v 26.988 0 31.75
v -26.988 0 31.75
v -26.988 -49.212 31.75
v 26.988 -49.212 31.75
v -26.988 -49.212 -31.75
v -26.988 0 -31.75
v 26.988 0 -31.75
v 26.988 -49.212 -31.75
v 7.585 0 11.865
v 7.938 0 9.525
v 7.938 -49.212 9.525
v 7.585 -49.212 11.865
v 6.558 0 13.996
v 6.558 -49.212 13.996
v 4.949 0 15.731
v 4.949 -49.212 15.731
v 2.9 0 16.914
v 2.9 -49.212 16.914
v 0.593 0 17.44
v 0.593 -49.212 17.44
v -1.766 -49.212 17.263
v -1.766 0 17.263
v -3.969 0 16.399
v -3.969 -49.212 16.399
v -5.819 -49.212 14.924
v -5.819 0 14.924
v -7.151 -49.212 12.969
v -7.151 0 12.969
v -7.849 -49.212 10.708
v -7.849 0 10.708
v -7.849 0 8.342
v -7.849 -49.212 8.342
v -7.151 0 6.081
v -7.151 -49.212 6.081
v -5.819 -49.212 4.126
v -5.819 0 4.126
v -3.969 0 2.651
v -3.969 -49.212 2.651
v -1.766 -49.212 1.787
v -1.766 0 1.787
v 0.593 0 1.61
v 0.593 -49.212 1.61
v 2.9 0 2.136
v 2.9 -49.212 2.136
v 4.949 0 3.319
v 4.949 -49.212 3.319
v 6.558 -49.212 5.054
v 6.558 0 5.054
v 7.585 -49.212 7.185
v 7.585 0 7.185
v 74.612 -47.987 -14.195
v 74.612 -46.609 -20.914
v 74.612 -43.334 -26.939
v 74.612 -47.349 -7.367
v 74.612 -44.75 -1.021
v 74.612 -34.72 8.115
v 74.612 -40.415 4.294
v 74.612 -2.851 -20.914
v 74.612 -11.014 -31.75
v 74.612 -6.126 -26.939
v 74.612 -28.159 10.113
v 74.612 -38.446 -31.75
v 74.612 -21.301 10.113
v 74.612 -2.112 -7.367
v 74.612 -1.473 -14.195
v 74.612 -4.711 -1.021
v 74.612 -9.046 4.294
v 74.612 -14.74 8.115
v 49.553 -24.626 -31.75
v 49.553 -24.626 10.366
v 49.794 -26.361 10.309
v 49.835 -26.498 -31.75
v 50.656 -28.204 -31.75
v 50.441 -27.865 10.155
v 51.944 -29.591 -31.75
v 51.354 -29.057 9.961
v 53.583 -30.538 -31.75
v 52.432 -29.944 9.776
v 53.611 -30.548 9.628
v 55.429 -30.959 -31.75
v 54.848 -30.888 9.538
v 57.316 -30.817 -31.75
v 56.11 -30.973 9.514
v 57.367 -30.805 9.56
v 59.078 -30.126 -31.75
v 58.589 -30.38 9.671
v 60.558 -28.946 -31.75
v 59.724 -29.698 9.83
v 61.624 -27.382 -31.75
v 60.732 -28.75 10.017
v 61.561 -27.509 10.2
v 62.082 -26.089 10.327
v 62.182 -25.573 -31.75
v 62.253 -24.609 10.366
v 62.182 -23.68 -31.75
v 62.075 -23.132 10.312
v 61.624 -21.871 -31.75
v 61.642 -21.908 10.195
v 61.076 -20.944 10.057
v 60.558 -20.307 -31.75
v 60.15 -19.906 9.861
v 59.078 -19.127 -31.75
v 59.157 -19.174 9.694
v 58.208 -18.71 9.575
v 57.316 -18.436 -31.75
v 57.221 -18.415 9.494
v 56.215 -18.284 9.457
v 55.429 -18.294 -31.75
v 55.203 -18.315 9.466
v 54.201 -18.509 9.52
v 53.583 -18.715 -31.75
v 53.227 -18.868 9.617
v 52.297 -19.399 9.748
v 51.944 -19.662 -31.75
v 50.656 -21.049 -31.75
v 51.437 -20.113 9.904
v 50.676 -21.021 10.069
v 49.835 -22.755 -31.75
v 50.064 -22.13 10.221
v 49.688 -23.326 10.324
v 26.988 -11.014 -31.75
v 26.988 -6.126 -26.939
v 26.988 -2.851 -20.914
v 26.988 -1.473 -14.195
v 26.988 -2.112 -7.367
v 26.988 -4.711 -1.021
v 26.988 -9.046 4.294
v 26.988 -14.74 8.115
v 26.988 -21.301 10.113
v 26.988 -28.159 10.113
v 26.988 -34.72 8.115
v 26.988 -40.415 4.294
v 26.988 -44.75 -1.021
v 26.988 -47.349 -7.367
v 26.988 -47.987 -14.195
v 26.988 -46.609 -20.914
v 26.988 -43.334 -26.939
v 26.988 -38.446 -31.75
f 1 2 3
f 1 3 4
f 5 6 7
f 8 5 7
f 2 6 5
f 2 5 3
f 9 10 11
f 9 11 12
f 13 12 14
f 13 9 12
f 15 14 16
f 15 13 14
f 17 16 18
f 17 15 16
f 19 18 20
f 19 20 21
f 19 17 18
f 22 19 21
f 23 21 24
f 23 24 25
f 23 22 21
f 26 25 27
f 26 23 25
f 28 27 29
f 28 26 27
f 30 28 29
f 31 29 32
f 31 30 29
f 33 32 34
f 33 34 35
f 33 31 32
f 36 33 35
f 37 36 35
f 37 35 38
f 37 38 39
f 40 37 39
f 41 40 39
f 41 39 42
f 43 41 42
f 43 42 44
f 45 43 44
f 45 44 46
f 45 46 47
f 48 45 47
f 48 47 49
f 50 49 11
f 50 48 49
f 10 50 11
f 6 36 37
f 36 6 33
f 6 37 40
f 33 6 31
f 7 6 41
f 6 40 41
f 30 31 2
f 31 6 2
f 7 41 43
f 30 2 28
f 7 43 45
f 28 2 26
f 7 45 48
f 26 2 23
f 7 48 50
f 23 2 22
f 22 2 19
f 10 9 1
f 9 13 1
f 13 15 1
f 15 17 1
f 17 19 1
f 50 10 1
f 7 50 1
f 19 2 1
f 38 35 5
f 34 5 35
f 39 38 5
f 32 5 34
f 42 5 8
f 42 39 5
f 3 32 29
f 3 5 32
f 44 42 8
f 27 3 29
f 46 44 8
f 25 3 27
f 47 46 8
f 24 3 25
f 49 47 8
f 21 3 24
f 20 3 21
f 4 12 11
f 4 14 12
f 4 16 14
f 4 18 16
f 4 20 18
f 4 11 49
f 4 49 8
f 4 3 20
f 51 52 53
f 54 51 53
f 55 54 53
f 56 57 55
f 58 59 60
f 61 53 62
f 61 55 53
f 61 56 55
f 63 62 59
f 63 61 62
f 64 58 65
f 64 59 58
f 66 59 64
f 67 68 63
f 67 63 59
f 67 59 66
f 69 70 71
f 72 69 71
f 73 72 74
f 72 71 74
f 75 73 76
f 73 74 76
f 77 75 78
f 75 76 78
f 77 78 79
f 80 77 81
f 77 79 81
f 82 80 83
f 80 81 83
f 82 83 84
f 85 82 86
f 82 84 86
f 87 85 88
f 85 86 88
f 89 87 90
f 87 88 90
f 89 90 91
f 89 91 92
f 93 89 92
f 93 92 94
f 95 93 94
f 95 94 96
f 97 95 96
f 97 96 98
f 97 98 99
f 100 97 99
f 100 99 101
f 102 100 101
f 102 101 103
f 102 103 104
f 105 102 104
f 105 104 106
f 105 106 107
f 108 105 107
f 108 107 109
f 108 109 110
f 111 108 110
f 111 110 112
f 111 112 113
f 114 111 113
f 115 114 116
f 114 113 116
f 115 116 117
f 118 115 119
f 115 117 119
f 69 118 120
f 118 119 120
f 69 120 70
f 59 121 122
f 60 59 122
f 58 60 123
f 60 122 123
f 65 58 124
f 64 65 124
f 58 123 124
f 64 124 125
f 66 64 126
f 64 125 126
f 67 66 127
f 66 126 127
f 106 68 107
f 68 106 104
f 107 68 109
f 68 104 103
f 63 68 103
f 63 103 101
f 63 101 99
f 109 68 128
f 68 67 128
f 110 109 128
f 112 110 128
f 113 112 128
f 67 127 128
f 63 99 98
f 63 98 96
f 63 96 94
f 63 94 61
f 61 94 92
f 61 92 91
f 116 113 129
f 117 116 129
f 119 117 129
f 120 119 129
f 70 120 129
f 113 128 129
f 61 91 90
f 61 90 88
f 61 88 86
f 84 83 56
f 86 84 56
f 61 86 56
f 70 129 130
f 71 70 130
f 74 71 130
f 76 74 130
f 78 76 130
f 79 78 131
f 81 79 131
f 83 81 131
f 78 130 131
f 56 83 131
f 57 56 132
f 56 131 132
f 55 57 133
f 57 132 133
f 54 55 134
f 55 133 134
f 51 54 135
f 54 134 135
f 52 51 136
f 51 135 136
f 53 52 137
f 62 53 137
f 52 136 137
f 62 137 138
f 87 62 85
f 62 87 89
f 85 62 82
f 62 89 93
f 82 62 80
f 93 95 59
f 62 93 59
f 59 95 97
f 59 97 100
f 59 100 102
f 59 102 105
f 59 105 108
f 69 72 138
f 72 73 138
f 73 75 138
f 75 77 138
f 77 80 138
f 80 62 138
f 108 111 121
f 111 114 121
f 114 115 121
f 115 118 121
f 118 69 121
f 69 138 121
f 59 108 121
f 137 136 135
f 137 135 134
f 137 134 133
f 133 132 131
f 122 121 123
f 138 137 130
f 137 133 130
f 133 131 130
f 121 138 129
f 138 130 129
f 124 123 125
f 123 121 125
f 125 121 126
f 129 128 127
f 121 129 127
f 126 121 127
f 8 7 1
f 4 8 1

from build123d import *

# Parameters (mm, degrees)
F0_W     = 53.975
F0_H     = 63.5
F0_R     = 7.9375
F1_DEPTH = 49.2125
F3_DEPTH = 47.625
F5_D     = 12.7
F5_DEPTH = 50.8


with BuildPart() as f1:
    # F0 (on Front) → F1 (new body)
    with BuildSketch(Plane.XZ):
        Rectangle(F0_W, F0_H)
        with Locations((0, 9.525)):
            Circle(F0_R, mode=Mode.SUBTRACT)
    extrude(amount=F1_DEPTH)


with BuildPart() as f3:
    # F2 (on face) → F3 (new body)
    with BuildSketch(Plane.YZ.offset(26.9875)):
        with BuildLine():
            Line((-38.446363, -31.75), (-11.014364, -31.75))
            ThreePointArc((-11.014364, -31.75), (-24.730363, 10.366501), (-38.446363, -31.75))
        make_face()
    extrude(amount=F3_DEPTH)

    # F5
    with Locations(Plane(origin=(0, 0, -31.75), x_dir=(1, 0, 0), z_dir=(0, 0, -1))):
        with Locations((55.903092, 24.626456)):
            Hole(F5_D / 2, depth=F5_DEPTH)


solid = Compound([f1.part, f3.part])
